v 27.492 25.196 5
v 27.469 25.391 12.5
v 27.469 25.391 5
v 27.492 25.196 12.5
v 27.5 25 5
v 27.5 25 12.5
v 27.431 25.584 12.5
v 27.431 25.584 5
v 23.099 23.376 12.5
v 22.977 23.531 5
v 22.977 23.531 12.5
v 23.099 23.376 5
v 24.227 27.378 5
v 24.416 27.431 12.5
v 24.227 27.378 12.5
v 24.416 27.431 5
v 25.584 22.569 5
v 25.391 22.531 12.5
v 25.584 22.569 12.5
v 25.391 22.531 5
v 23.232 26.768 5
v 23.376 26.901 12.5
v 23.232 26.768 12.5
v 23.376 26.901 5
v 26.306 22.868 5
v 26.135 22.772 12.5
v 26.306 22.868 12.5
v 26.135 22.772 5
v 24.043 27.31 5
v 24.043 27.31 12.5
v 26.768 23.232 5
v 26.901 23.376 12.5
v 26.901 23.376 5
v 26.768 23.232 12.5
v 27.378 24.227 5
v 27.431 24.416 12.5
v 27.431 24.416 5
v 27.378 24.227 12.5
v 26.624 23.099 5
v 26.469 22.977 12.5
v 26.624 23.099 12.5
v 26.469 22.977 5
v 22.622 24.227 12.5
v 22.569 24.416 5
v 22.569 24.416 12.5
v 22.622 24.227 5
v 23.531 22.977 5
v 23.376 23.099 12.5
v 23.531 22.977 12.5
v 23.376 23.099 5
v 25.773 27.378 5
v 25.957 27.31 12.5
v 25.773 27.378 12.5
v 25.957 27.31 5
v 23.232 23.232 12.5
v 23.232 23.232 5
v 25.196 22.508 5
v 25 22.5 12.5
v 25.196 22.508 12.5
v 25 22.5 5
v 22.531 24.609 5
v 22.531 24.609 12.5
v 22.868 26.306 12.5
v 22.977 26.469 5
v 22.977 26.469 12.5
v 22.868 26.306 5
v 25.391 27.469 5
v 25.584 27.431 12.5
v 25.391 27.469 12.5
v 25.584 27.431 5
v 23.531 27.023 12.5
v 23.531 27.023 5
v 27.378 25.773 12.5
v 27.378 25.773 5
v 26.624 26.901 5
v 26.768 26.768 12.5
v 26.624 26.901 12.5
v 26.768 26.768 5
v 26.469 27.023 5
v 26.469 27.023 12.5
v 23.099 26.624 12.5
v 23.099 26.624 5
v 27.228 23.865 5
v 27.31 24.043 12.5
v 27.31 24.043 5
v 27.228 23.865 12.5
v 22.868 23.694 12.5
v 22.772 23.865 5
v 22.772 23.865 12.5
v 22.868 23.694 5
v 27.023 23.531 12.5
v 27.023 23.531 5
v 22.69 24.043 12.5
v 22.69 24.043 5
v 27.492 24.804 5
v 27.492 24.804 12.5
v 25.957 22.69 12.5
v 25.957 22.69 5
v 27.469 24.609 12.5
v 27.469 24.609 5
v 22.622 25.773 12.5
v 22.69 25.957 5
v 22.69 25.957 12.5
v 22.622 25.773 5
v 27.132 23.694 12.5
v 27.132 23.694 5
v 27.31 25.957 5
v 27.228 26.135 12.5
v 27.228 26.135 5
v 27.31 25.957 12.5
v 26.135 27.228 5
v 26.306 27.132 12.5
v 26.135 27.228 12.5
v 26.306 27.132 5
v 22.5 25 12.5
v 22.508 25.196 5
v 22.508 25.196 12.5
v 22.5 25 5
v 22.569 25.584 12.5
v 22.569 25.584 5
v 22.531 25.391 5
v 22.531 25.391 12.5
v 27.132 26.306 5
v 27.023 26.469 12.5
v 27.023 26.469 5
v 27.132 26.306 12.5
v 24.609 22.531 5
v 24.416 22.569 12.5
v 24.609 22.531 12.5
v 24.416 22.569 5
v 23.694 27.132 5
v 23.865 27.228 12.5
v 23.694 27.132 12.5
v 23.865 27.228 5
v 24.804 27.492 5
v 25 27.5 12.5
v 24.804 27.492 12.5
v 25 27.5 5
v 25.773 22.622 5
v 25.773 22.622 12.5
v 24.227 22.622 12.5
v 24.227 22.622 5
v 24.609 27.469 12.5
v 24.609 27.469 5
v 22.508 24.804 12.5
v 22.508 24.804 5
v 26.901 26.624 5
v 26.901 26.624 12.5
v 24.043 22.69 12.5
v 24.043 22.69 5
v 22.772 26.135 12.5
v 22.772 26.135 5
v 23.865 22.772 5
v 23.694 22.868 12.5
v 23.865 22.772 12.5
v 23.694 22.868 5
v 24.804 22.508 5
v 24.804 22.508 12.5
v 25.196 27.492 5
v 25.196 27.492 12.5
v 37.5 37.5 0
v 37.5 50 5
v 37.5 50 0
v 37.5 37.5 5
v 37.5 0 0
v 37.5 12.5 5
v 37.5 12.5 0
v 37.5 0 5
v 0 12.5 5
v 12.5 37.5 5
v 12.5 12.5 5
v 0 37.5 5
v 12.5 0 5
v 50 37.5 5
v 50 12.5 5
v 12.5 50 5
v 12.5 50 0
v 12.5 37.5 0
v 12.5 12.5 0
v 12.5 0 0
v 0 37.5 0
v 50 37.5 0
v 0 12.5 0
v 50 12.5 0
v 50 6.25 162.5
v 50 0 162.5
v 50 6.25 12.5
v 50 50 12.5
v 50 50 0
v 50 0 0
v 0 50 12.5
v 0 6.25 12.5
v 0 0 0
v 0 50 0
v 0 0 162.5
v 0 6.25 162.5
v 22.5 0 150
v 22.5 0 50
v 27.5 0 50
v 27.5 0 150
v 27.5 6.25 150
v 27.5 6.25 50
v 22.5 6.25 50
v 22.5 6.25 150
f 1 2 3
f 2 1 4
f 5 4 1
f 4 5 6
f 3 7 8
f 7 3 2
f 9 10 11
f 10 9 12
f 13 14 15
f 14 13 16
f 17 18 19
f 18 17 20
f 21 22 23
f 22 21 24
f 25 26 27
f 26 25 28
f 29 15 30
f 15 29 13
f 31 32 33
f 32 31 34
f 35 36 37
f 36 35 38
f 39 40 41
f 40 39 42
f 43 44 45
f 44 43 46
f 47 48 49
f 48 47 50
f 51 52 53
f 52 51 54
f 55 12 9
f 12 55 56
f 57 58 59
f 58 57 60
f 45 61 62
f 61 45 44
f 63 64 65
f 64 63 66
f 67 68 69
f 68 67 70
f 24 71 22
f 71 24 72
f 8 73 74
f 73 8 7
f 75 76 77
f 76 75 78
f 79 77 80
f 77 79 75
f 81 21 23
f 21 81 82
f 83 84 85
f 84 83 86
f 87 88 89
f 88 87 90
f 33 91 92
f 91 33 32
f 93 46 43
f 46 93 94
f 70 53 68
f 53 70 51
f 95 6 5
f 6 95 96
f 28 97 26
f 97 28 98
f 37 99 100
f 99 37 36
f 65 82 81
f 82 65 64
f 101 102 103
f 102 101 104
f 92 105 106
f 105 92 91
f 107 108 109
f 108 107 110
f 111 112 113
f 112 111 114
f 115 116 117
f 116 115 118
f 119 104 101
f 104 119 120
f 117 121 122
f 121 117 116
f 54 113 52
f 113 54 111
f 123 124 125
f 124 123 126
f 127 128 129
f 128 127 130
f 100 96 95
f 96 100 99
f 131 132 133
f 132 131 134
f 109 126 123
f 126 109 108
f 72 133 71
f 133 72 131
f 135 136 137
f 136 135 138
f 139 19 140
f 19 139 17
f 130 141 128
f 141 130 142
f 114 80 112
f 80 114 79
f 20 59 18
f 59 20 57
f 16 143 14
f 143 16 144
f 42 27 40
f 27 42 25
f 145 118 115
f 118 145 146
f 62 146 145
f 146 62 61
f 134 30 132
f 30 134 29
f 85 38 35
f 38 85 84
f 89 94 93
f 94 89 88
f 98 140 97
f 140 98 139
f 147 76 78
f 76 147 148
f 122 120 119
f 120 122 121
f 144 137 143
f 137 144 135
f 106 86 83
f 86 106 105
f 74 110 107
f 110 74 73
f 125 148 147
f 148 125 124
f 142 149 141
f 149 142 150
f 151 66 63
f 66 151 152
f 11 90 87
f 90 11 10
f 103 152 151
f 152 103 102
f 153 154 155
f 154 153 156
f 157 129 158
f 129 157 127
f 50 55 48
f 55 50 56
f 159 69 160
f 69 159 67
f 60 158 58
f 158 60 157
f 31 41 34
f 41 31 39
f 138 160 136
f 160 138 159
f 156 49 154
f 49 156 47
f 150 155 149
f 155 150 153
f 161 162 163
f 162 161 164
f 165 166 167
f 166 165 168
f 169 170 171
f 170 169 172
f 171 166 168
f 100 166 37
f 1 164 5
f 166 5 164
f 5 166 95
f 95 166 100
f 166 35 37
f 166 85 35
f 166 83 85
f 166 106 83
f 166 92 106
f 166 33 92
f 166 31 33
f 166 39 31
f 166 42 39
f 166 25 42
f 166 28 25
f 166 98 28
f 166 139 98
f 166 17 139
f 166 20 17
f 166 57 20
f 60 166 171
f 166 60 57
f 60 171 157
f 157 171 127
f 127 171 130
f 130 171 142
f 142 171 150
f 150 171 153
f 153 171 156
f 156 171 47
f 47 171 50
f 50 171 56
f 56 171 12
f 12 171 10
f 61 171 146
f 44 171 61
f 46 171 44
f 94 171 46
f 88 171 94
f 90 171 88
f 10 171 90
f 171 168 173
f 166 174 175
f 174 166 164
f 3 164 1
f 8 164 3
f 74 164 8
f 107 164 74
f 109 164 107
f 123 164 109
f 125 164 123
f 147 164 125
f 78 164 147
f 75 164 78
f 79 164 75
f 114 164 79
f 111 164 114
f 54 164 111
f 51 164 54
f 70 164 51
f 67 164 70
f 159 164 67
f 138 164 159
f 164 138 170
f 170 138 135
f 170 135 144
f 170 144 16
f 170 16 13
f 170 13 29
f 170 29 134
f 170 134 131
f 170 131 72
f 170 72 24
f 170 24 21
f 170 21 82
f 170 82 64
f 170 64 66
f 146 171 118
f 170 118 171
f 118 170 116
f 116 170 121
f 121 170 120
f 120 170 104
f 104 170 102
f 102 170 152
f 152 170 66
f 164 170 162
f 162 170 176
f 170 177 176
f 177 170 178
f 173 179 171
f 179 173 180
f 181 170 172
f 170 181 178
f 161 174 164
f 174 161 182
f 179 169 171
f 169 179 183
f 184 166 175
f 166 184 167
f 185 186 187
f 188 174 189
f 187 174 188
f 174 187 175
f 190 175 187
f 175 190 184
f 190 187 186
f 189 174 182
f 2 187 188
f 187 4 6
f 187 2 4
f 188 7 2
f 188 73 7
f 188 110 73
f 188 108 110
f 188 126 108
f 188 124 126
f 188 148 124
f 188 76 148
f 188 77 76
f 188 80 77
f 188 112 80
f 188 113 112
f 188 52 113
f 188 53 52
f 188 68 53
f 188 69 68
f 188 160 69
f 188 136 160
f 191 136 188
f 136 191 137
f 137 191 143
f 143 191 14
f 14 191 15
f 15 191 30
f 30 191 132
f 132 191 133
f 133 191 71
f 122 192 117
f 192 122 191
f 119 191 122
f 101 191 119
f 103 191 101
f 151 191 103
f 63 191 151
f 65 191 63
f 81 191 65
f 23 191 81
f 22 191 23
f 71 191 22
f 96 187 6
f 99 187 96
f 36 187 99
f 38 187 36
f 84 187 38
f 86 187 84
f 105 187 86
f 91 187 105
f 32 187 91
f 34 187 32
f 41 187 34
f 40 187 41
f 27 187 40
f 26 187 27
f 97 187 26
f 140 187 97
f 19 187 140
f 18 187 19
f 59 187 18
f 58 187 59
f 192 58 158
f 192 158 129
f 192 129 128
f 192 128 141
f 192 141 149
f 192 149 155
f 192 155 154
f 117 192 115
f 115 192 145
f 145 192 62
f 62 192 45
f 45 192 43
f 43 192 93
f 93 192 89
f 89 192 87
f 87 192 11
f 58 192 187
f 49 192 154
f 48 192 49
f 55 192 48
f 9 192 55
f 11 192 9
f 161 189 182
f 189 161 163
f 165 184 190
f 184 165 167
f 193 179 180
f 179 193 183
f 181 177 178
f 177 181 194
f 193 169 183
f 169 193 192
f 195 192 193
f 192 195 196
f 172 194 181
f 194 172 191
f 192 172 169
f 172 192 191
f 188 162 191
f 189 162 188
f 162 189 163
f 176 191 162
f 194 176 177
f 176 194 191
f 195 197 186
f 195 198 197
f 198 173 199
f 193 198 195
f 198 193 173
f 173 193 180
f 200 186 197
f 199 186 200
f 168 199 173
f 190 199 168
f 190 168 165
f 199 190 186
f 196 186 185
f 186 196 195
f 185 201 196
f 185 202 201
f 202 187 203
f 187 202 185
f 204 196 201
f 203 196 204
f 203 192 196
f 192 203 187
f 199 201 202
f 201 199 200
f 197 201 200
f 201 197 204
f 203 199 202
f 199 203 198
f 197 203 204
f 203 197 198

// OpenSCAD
// file: Modules.scad
/*
 * Jig to hold a model airplane while working on it.
 *
 * Vertical sections slide horizonally. Horizontal dimensions are scalable
 * by adding one or more extension bars.
 *
 * Wing supports clamp magnetically. Be sure to glue some felt on the
 * insides of the wing supports to protect the model
 *
 * ©Louis Kowolowski 2020
 */

module tail_holder () {
	translate ([3*bar_w, 0, 10]) {
		rotate ([0, 180, 0]) {
			tail_holder_bottom ();
		}
	}
	// height is +5 (thickness of top) because its been flipped over
	translate ([0, 0, -7]) {
		tail_holder_top ();
	}
}

module tail_holder_bottom () {
	difference () {
		cube ([3*bar_w, 1.5*bar_screw_head_d, bar_w/4]);

		union () {
			// screw/nut hole
			translate ([1.5*bar_w, 1.5*bar_screw_head_d+0.001, bar_w/8]) {
				rotate ([90, 0, 0]) {
					bar_screw ();
				}
			}
			// left magnet hole
			translate ([0.75*bar_screw_head_d, 1.5*bar_screw_d, bar_w/4-magnet_h+0.001]) {
				cylinder (magnet_h, d=magnet_d, $fn=80);
			}
			// right magnet hole
			translate ([(3*bar_w)-(0.75*bar_screw_head_d), 1.5*bar_screw_d, bar_w/4-magnet_h+0.001]) {
				cylinder (magnet_h, d=magnet_d, $fn=80);
			}
		}
	}
	// left side
	translate ([0, 1.5*bar_screw_head_d, 0]) {
		cube ([bar_w, bar_w, 5]);
	}

	// right side
	translate ([2*bar_w, 1.5*bar_screw_head_d, 0]) {
		cube ([bar_w, bar_w, 5]);
	}

}

module tail_holder_top () {

	difference () {
		cube ([3*bar_w, 1.5*bar_screw_head_d, 5]);
		union () {
			// left magnet hole
			translate ([0.75*bar_screw_head_d, 1.5*bar_screw_d, 5.001-magnet_h]) {
				cylinder (magnet_h, d=magnet_d, $fn=80);
			}
			// right magnet hole
			translate ([(3*bar_w)-(0.75*bar_screw_head_d), 1.5*bar_screw_d, 5.001-magnet_h]) {
				cylinder (magnet_h, d=magnet_d, $fn=80);
			}
		}
	}
	// left side
	translate ([0, 1.5*bar_screw_head_d, 0]) {
		cube ([bar_w, bar_w, 5]);
	}

	// right side
	translate ([2*bar_w, 1.5*bar_screw_head_d, 0]) {
		cube ([bar_w, bar_w, 5]);
	}
}

module nose_holder () {
	difference () {
		union () {
			cube ([bar_w, bar_w, 6]);
			translate ([0, 0, 6]) {
				// rear block to house screw/nut holder and magnets for top
				cube ([bar_screw_head_d, bar_w, 1.5*bar_screw_head_d]);
			}
			translate ([0, 0, 6]) {
				// rear block to house screw/nut holder and magnets for top
				cube ([bar_w, bar_w, 1.5*bar_screw_head_d]);
			}
		}
		union () {
			// screw/nut hole
			translate ([bar_screw_head_d+1, bar_w/2, 10]) {
				rotate ([0, 270, 0]) {
					bar_screw ();
				}
			}
			// angled cut to hold nose centered in jib
			translate ([bar_w/2+.5*bar_screw_head_d+0.001, bar_w/2, bar_w/2-5]) {
				rotate ([270, 210, 90]) {
					Triangle(a=bar_w, b=bar_w, angle=120, height=bar_w-bar_screw_head_d+0.001, centerXYZ=[true,true,true]);
				}
			}
			
		}
	}
}


module wing_holder () {
	wing_holder_bottom ();

	translate ([0, 0, 1.5*bar_screw_head_d+2]) {
		wing_holder_top ();
	}
}

module wing_holder_bottom () {
	// slides up and down the riser to hold the wing at the correct height
	difference () {
		union () {
			cube ([bar_w, bar_w, 6]);
			translate ([0, 0, 6]) {
				// rear block to house screw/nut holder and magnets for top
				// add 1 to height for room above the nut
				cube ([bar_screw_head_d, bar_w, bar_screw_head_d+1]);
			}
		}
		union () {
			// screw/nut hole
			translate ([bar_screw_head_d+1, bar_w/2, 11]) {
				rotate ([0, 270, 0]) {
					bar_screw ();
				}
			}
			// magnet mounting holes
			translate ([magnet_d/2+2, magnet_d, bar_screw_head_d+4.001]) {
				rotate ([0, 0, 90]) {
					cylinder (magnet_h, d=magnet_d, $fn=80);
				}
			}
			// magnet mounting holes
			translate ([magnet_d/2+2, bar_w-magnet_d, bar_screw_head_d+4.001]) {
				rotate ([0, 0, 90]) {
					cylinder (magnet_h, d=magnet_d, $fn=80);
				}
			}
		}
	}
}

module wing_holder_top () {
	difference () {
		cube ([bar_w, bar_w, 6]);
		union () {
			// magnet mounting holes
			translate ([bar_w-magnet_d, magnet_d, -1*0.001]) {
				rotate ([0, 0, 90]) {
					cylinder (magnet_h, d=magnet_d, $fn=80);
				}
			}
			// magnet mounting holes
			translate ([bar_w-magnet_d, bar_w-magnet_d, -1*0.001]) {
				rotate ([0, 0, 90]) {
					cylinder (magnet_h, d=magnet_d, $fn=80);
				}
			}
		}
	}
}

module riser () {
	/* vertical bar that will slide forward/backward on the base and hold the
	 * horizontal rest(s) for the model
	 */
	difference () {
		// base
		cube ([riser_w, riser_w, riser_w/4]);	
		union () {
			// slot at bottom for guide on bar
			translate ([riser_w/4, -1*0.001, -1*0.01]) {
				cube ([riser_w/2, riser_w+1, 5.01]);
			}
			// cross slot at bottom for guide on bar
			translate ([-0.001, riser_w/4, -1*0.01]) {
				cube ([riser_w+1, riser_w/2, 5.01]);
			}
			// screw hole
			translate ([riser_w/2, riser_w/2, -1*bar_screw_head_h]) {
				bar_screw ();
			}
		}
	}
	difference () {
		// vartical riser
		translate ([0, 0, riser_w/4]) {
			cube ([riser_w, riser_w/8, riser_l]);
		}
		// screw slot
		translate ([riser_w/2-bar_screw_d/2, -1, riser_w]) {
			cube ([bar_screw_d, riser_w/4+1, riser_l-riser_w]);
		}
	}
}

module bar_screw () {
	// Model of a screw and hex head/nut

	// screw head
	cylinder(bar_screw_head_h, d=bar_screw_head_d, $fn=6);
	translate ([0, 0, 0]) {
		// screw body
		cylinder(bar_screw_h, d=bar_screw_d, $fn=80);
	}
}

module bar () {
	/* lower base unit. Comes together as a cross. Each bar can be extended with
	 * additional bars.
	 * Raised section acts as a guide for the riser. Slot down the middle is for
	 * a clamping butterfly screw.
	 */
	difference () {
		union () {
			cube ([bar_l, bar_w, bar_h]);
			translate ([0, bar_w/4, 0]) {
				// guide slot
				cube ([bar_l, bar_w/2, bar_h+5]);
			}
		}
		translate ([1, bar_w/2-bar_screw_d/2, -0.001]) {
			cube ([bar_l-2, bar_screw_d, bar_screw_h]);
		}
		translate ([1, bar_w/2-bar_screw_head_d/2, -0.001]) {
			 cube ([bar_l, bar_screw_head_d, bar_screw_head_h+1]);
		}
	}
	// upper extension
	difference () {
		translate ([bar_l, 0, bar_h/2]) {
			cube ([bar_w/4, bar_w, bar_h/2]);
		}
		union () {
			// 2 screw holes
			// left
			translate ([bar_l+bar_w/8, bar_w/8, -1*0.001]) {
				bar_screw ();
			}
			// right
			translate ([bar_l+bar_w/8, bar_w-bar_w/8, -1*0.001]) {
				bar_screw ();
			}
		}
	}
	// lower extension
	difference () {
		translate ([-1*bar_w/4, 0, 0]) {
			cube ([bar_w/4, bar_w, bar_h/2]);
		}
		union () {
			// 2 screw holes
			// left
			translate ([-1*bar_w/4+bar_w/8, bar_w/8, -1*0.001]) {
				bar_screw ();
			}
			// right
			translate ([-1*bar_w/4+bar_w/8, bar_w-bar_w/8, -1*0.001]) {
				bar_screw ();
			}
		}
	}

}

module Triangle(
			a, b, angle, height=1, heights=undef,
			center=undef, centerXYZ=[false,false,false]) {
	// Calculate Heights at each point
	heightAB = ((heights==undef) ? height : heights[0])/2;
	heightBC = ((heights==undef) ? height : heights[1])/2;
	heightCA = ((heights==undef) ? height : heights[2])/2;
	centerZ = (center || (center==undef && centerXYZ[2]))?0:max(heightAB,heightBC,heightCA);

	// Calculate Offsets for centering
	offsetX = (center || (center==undef && centerXYZ[0]))?((cos(angle)*a)+b)/3:0;
	offsetY = (center || (center==undef && centerXYZ[1]))?(sin(angle)*a)/3:0;
	
	pointAB1 = [-offsetX,-offsetY, centerZ-heightAB];
	pointAB2 = [-offsetX,-offsetY, centerZ+heightAB];
	pointBC1 = [b-offsetX,-offsetY, centerZ-heightBC];
	pointBC2 = [b-offsetX,-offsetY, centerZ+heightBC];
	pointCA1 = [(cos(angle)*a)-offsetX,(sin(angle)*a)-offsetY, centerZ-heightCA];
	pointCA2 = [(cos(angle)*a)-offsetX,(sin(angle)*a)-offsetY, centerZ+heightCA];

	polyhedron(
		points=[	pointAB1, pointBC1, pointCA1,
					pointAB2, pointBC2, pointCA2 ],
		faces=[	
			[0, 1, 2],
			[3, 5, 4],
			[0, 3, 1],
			[1, 3, 4],
			[1, 4, 2],
			[2, 4, 5],
			[2, 5, 0],
			[0, 5, 3] ] );
}
// file: Globals.scad
/*
 * Global variables used for all the models
 * All units are in mm
 *
 * Jig to hold a model airplane while working on it.
 *
 * Vertical sections slide horizonally. Horizontal dimensions are scalable
 * by adding one or more extension bars.
 *
 * Wing supports clamp magnetically. Be sure to glue some felt on the
 * insides of the wing supports to protect the model
 *
 * ©Louis Kowolowski 2020
 */

/* long dimensions are constrained by the size of the print bed
 */
bar_l = 175;
bar_w = 50;
bar_h = 13;

riser_l = 150;
riser_w = 50;
riser_h = 12;

// M5x20
bar_screw_head_h = 4.8;
bar_screw_head_d = 9.6;
bar_screw_h = 20;
bar_screw_d = 5;

guide_rail_l = bar_l;
guide_rail_w = bar_w/2;
guide_rail_h = 2;

magnet_h = 3;
magnet_d = 5;
// main file
/*
 * Jig to hold a model airplane while working on it.
 *
 * Vertical sections slide horizonally. Horizontal dimensions are scalable
 * by adding one or more extension bars.
 *
 * Wing supports clamp magnetically. Be sure to glue some felt on the
 * insides of the wing supports to protect the model
 *
 * ©Louis Kowolowski 2020
 */

/*
 * Include globals and modules
 */
include <Globals.scad>;
include <Modules.scad>;

riser ();
